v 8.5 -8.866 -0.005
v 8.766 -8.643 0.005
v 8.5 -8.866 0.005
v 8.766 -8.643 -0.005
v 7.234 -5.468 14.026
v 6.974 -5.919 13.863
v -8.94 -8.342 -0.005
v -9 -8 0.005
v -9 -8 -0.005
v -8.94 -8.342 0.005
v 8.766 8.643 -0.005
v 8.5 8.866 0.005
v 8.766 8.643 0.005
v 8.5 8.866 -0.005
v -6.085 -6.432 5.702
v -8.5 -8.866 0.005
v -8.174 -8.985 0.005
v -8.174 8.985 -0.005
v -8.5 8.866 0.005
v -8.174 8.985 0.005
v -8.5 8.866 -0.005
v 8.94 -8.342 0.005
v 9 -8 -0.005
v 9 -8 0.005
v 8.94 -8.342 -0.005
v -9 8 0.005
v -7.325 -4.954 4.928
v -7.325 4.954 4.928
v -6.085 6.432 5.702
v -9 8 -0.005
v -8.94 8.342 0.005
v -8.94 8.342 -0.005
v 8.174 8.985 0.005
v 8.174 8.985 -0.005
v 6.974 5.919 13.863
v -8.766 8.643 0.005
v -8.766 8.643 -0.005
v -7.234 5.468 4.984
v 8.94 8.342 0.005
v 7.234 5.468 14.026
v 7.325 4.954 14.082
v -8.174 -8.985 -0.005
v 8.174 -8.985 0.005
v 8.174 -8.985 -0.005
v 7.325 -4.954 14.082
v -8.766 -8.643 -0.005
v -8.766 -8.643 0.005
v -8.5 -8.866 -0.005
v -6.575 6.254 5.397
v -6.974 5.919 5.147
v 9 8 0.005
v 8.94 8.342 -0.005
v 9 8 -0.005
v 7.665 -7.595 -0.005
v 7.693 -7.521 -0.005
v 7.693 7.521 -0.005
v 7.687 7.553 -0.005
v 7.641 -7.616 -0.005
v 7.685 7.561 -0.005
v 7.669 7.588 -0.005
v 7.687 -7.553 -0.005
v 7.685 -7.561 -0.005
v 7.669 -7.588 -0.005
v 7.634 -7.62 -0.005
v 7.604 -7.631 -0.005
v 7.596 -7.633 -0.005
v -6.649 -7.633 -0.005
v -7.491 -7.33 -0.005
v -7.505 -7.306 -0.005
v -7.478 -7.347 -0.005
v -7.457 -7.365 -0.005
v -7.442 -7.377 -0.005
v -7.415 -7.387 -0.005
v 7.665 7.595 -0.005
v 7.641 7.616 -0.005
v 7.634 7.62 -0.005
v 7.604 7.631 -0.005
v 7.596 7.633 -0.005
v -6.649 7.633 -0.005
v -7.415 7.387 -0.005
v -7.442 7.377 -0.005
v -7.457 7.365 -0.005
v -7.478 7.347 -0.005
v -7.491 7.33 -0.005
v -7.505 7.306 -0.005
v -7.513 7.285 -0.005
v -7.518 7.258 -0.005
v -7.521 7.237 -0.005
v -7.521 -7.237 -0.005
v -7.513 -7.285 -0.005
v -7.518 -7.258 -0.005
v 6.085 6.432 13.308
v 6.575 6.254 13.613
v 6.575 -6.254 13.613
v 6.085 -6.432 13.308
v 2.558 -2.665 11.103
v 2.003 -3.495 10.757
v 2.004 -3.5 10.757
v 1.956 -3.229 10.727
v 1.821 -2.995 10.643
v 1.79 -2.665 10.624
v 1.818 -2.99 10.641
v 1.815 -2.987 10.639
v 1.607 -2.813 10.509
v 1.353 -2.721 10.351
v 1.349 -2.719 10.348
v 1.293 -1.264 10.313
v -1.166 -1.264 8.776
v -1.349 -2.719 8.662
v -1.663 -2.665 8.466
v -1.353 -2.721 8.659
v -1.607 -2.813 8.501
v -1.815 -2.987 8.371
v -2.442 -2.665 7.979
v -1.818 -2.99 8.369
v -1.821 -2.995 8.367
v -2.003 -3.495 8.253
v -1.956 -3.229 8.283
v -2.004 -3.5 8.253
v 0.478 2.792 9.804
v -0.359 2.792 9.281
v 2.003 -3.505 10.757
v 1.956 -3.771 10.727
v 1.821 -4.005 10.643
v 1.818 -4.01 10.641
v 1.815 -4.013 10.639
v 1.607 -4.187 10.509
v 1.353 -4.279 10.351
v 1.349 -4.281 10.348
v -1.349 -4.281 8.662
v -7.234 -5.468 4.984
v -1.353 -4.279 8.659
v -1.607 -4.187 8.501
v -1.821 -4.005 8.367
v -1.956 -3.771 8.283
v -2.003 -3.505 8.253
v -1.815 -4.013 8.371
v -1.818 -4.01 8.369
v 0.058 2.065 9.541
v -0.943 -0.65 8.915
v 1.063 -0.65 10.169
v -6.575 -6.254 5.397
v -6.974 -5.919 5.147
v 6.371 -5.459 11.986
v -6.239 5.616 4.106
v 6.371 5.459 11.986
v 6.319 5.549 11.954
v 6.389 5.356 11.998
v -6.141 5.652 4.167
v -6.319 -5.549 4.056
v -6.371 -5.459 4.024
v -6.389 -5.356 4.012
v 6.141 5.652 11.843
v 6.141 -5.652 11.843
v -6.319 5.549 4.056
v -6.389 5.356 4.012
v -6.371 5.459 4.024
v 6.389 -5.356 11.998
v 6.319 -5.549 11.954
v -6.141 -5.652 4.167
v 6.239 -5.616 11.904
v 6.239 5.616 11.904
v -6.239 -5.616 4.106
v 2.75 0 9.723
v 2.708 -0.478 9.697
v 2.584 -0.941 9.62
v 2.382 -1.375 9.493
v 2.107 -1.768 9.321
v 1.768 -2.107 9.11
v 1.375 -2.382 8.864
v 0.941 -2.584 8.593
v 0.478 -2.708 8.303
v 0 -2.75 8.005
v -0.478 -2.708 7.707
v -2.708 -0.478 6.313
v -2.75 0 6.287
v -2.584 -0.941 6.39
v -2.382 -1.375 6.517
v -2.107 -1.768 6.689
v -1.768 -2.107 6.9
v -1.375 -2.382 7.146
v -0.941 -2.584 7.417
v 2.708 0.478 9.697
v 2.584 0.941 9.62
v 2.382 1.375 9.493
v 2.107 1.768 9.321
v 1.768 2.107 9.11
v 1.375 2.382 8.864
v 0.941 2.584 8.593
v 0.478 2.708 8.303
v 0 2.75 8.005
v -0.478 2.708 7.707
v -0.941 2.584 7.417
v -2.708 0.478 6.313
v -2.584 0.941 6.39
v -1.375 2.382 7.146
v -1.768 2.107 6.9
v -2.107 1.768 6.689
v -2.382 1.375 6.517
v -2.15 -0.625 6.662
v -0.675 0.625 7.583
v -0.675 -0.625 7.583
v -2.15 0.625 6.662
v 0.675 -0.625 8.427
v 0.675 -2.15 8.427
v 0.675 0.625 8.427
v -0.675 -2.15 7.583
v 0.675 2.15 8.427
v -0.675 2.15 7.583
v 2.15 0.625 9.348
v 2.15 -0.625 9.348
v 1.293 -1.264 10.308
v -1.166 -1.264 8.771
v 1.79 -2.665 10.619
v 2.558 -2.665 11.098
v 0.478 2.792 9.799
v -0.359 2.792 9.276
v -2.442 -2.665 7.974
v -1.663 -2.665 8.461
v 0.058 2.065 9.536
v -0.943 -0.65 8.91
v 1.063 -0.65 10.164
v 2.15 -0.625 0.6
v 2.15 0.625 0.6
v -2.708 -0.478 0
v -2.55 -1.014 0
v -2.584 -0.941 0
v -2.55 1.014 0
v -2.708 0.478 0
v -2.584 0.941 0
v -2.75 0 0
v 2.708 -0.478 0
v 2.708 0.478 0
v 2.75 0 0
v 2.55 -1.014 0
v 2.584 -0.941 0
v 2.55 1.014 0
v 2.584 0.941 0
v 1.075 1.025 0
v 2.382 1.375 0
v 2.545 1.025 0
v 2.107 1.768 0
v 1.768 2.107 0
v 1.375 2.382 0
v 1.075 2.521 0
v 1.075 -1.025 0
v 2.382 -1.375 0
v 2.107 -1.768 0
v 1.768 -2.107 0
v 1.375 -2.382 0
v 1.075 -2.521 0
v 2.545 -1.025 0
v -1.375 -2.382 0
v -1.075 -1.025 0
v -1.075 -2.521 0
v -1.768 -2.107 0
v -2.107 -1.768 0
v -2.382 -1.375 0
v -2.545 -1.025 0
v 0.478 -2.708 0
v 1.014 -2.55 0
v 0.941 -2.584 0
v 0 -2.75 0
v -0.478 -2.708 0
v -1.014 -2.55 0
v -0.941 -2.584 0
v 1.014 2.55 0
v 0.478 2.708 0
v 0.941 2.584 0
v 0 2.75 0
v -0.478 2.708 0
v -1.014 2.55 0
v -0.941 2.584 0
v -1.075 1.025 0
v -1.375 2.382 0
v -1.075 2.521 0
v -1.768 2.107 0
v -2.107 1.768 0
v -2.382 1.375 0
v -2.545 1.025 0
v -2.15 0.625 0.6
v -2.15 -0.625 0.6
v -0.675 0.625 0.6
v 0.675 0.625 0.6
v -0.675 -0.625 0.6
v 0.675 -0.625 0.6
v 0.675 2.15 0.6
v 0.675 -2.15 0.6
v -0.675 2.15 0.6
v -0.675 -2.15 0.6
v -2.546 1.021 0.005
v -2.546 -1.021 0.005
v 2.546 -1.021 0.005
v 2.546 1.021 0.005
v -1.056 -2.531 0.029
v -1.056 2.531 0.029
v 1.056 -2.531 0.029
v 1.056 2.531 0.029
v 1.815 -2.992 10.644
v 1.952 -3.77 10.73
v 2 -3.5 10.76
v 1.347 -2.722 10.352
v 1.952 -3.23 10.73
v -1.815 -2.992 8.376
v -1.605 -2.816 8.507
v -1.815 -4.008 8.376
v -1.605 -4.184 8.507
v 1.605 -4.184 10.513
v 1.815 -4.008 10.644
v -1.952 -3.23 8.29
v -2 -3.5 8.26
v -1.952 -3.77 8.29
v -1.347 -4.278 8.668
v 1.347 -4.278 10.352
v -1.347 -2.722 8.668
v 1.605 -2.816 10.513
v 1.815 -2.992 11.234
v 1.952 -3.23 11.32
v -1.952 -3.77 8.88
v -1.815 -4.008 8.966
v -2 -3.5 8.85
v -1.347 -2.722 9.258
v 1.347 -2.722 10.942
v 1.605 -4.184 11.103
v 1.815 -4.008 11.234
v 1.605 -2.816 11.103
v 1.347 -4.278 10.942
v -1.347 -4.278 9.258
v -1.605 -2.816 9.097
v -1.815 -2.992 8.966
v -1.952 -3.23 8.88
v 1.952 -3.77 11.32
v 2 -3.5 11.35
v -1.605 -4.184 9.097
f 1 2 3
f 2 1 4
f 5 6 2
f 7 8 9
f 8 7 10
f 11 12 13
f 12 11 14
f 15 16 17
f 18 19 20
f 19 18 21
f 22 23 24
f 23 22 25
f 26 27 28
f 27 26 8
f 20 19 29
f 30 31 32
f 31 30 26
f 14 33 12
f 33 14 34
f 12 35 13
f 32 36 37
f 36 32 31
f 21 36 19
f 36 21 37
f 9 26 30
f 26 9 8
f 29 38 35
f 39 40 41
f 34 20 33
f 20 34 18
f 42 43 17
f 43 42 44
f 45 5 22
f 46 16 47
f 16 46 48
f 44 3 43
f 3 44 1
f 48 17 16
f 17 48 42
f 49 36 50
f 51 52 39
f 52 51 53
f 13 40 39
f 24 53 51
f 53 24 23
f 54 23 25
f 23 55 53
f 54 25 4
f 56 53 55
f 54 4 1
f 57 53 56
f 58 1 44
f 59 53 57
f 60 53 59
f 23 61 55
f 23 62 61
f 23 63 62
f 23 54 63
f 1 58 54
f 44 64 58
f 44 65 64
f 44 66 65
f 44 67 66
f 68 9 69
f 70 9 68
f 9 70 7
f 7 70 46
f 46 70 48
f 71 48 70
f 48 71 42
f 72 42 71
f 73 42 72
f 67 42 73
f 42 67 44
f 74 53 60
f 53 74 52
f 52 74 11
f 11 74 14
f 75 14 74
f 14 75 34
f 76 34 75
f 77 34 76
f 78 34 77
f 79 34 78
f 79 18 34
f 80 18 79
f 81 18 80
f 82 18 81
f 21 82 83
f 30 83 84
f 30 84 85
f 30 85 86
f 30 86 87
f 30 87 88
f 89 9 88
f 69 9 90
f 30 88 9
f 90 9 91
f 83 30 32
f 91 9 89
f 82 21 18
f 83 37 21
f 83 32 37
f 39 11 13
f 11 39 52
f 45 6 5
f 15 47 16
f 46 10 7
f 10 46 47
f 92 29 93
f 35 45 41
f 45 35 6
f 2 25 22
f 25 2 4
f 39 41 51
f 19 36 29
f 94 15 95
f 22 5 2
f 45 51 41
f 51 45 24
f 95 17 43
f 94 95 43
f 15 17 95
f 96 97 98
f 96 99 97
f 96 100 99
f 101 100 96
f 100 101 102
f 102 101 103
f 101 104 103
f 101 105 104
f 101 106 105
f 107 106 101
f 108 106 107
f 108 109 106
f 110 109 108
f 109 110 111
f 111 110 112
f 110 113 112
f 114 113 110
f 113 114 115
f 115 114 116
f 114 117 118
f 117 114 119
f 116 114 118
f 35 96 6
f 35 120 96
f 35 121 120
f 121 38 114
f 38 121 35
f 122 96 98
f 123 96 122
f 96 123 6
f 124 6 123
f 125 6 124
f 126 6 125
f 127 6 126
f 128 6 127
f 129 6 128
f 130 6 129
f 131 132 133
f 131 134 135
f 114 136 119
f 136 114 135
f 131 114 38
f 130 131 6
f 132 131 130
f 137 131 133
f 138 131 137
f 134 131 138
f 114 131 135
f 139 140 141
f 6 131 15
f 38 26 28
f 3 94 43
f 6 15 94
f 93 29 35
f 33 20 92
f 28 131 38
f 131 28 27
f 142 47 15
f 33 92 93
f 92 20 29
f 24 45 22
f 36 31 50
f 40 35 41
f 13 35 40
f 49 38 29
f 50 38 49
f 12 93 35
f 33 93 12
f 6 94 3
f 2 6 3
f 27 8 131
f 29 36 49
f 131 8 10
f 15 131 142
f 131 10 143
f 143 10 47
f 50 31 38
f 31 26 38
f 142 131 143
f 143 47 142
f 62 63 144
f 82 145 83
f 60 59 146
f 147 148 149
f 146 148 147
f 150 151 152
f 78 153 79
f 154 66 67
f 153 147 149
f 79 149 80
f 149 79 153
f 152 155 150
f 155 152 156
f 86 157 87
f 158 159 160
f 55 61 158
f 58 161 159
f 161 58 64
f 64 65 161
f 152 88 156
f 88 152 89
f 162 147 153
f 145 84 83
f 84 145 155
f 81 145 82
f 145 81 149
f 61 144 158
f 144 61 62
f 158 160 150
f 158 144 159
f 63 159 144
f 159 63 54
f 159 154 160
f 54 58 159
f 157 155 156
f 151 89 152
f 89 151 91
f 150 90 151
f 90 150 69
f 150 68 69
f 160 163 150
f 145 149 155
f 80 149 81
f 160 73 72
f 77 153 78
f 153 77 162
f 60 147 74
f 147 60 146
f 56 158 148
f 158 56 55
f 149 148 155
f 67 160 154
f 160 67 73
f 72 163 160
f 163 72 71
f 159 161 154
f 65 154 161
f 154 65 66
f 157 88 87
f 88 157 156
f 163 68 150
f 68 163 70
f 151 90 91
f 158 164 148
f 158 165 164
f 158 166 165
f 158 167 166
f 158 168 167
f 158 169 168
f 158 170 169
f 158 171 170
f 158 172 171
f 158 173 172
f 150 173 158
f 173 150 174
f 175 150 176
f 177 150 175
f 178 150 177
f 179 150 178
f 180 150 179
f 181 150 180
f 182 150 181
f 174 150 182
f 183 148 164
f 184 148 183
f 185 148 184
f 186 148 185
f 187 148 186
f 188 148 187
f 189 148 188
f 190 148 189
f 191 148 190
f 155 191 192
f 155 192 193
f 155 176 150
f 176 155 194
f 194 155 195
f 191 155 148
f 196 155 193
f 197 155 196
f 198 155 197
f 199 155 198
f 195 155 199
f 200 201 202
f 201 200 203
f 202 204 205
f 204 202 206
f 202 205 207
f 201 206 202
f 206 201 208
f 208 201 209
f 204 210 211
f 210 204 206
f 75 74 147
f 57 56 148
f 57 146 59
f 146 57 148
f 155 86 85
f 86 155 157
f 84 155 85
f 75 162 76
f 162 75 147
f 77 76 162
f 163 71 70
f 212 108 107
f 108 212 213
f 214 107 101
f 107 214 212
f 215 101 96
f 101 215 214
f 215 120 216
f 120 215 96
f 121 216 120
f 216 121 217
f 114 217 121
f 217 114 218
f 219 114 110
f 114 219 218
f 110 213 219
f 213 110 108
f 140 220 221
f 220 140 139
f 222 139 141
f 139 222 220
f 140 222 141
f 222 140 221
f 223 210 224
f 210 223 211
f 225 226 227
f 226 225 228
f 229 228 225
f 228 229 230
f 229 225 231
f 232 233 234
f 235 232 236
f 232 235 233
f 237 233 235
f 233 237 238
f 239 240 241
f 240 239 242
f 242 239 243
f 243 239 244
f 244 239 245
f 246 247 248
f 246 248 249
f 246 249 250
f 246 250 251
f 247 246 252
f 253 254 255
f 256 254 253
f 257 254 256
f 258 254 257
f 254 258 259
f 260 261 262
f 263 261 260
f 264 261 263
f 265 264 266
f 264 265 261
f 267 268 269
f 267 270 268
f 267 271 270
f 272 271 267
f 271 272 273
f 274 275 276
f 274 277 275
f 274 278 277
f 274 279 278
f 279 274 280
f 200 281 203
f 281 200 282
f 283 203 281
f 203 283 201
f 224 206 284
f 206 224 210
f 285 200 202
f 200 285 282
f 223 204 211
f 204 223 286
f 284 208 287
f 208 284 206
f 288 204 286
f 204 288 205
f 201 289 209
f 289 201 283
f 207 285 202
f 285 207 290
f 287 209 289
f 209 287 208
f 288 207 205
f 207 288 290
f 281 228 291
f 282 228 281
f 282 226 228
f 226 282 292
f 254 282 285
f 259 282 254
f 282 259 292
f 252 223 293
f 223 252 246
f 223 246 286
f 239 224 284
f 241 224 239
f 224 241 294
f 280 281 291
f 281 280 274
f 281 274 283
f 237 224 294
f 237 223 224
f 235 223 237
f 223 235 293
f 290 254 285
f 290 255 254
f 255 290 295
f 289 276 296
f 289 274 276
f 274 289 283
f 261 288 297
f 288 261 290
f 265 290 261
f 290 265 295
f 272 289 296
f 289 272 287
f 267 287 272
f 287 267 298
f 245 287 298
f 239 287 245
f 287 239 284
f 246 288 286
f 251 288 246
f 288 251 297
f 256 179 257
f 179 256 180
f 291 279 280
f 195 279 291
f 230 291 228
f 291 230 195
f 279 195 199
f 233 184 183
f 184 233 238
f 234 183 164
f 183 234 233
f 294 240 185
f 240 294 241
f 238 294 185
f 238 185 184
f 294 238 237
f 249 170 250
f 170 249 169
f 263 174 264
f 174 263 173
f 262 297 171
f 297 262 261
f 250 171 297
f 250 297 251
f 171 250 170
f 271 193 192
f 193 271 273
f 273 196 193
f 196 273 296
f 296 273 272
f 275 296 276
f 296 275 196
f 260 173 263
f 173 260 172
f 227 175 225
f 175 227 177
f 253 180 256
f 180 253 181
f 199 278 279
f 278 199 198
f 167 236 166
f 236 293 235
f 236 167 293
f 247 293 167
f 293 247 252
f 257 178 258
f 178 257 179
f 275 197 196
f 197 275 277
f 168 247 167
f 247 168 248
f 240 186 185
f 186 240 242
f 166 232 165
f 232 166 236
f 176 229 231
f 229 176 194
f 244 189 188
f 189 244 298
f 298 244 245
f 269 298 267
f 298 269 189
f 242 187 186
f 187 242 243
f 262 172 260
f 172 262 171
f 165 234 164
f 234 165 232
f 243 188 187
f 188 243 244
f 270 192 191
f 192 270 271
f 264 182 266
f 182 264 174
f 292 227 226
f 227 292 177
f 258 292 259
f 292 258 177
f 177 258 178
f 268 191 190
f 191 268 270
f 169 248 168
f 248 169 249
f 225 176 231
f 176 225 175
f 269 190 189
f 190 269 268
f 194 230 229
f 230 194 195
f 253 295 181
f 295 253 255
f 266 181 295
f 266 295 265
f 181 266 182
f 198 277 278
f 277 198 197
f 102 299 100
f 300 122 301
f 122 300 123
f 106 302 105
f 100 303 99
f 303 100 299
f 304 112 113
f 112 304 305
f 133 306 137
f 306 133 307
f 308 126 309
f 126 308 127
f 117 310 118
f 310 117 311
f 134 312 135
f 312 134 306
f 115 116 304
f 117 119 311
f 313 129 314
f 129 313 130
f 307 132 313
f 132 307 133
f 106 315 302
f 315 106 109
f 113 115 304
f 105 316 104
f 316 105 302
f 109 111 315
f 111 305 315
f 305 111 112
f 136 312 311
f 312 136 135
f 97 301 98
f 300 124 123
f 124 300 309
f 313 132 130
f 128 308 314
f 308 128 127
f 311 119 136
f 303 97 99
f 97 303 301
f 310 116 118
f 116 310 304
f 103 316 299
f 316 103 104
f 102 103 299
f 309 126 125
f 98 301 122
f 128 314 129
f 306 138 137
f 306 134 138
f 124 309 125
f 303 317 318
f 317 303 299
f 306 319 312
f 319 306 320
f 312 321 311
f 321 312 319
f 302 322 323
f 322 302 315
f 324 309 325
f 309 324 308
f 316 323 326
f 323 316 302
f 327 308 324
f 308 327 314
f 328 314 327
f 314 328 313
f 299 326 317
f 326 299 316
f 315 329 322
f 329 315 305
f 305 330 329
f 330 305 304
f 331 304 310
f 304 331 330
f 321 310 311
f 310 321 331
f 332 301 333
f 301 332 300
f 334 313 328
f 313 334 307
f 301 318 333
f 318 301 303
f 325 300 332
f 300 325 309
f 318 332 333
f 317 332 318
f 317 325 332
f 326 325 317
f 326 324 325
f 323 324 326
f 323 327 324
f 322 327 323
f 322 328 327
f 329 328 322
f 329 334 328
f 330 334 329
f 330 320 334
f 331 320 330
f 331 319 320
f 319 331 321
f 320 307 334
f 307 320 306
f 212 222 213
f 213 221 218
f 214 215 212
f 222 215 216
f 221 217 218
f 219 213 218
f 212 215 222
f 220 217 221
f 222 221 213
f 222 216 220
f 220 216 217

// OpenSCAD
// file: ../modules/homing_bar.scad
function homing_bar_quality_steps(quality, preview_steps, export_steps) =
    quality == "preview" ? preview_steps : export_steps;

module homing_bar_profile(length, width, quality = "export") {
    end_steps = homing_bar_quality_steps(quality, 18, 32);
    cap_length = max(length, width);

    hull() {
        translate([-cap_length / 2 + width / 2, 0])
            circle(d = width, $fn = end_steps);
        translate([ cap_length / 2 - width / 2, 0])
            circle(d = width, $fn = end_steps);
    }
}

module homing_bar_blank(
    length,
    width,
    height,
    base_thickness,
    offset_y,
    base_z,
    quality = "export"
) {
    cap_height = max(height, 0.05);
    contact_height = max(base_thickness, 0.05);
    contact_length = length + contact_height * 1.6;
    contact_width = width + contact_height * 1.2;

    translate([0, offset_y, base_z])
        union() {
            hull() {
                linear_extrude(height = 0.01)
                    homing_bar_profile(contact_length, contact_width, quality);
                translate([0, 0, contact_height])
                    linear_extrude(height = 0.01)
                        homing_bar_profile(length, width, quality);
            }

            translate([0, 0, contact_height])
                linear_extrude(height = cap_height)
                    homing_bar_profile(length, width, quality);
        }
}
// file: ../modules/stem_alps.scad
function positive_alps_stem_dimension(value, minimum = 0.1) = max(value, minimum);

module alps_post(stem_length, stem_width, stem_height, lead_in) {
    safe_length = positive_alps_stem_dimension(stem_length);
    safe_width = positive_alps_stem_dimension(stem_width);
    safe_height = max(stem_height, 0.2);
    safe_lead_in = min(lead_in, safe_length * 0.2, safe_width * 0.3, safe_height * 0.4);

    hull() {
        linear_extrude(height = max(safe_height - safe_lead_in, 0.01))
            square([safe_length, safe_width], center = true);

        translate([0, 0, safe_height - 0.01])
            linear_extrude(height = 0.01)
                square([
                    positive_alps_stem_dimension(safe_length - safe_lead_in * 2),
                    positive_alps_stem_dimension(safe_width - safe_lead_in * 2)
                ], center = true);
    }
}

module stem_alps(
    stem_length = 4.45,
    stem_width = 2.25,
    stem_height = 3.5,
    base_clearance = 0,
    lead_in = 0.12,
    quality = "export"
) {
    translate([0, 0, base_clearance])
        alps_post(stem_length, stem_width, stem_height, lead_in);
}
// file: ../modules/stem_choc_v2.scad
use <stem_mx.scad>

module stem_choc_v2(
    outer_diameter = 5.5,
    stem_height = 6.5,
    base_clearance = 0,
    cross_width_horizontal = 1.25,
    cross_length_horizontal = 4.3,
    cross_width_vertical = 1.35,
    cross_length_vertical = 4.3,
    cross_chamfer = 0.4,
    chamfer_height = 0.6,
    quality = "export"
) {
    stem_mx(
        outer_diameter = outer_diameter,
        stem_height = stem_height,
        base_clearance = base_clearance,
        cross_width_horizontal = cross_width_horizontal,
        cross_length_horizontal = cross_length_horizontal,
        cross_width_vertical = cross_width_vertical,
        cross_length_vertical = cross_length_vertical,
        cross_chamfer = cross_chamfer,
        chamfer_height = chamfer_height,
        quality = quality
    );
}
// file: ../modules/stem_choc_v1.scad
function positive_choc_stem_dimension(value, minimum = 0.1) = max(value, minimum);

module choc_v1_prong(prong_width, prong_depth, prong_height, lead_in) {
    safe_width = positive_choc_stem_dimension(prong_width);
    safe_depth = positive_choc_stem_dimension(prong_depth);
    safe_height = max(prong_height, 0.2);
    safe_lead_in = min(lead_in, safe_width * 0.4, safe_depth * 0.2, safe_height * 0.4);

    hull() {
        linear_extrude(height = max(safe_height - safe_lead_in, 0.01))
            square([safe_width, safe_depth], center = true);

        translate([0, 0, safe_height - 0.01])
            linear_extrude(height = 0.01)
                square([
                    positive_choc_stem_dimension(safe_width - safe_lead_in * 2),
                    positive_choc_stem_dimension(safe_depth - safe_lead_in * 2)
                ], center = true);
    }
}

module stem_choc_v1(
    prong_width = 1.2,
    prong_depth = 3.0,
    prong_spacing = 5.7,
    stem_height = 3.0,
    base_clearance = 0,
    lead_in = 0.12,
    quality = "export"
) {
    for (offset_x = [prong_spacing / 2, -prong_spacing / 2]) {
        translate([offset_x, 0, base_clearance])
            choc_v1_prong(prong_width, prong_depth, stem_height, lead_in);
    }
}
// file: ../modules/stem_mx.scad
function stem_quality_steps(quality, preview_steps, export_steps) =
    quality == "preview" ? preview_steps : export_steps;

module stem_slot(length, width, height) {
    translate([-length / 2, -width / 2, 0])
        cube([length, width, height]);
}

module stem_mx(
    outer_diameter = 5.5,
    stem_height = 4.5,
    base_clearance = 0,
    cross_width_horizontal = 1.25,
    cross_length_horizontal = 4.3,
    cross_width_vertical = 1.35,
    cross_length_vertical = 4.3,
    cross_chamfer = 0.4,
    chamfer_height = 0.6,
    quality = "export"
) {
    outer_steps = stem_quality_steps(quality, 36, 64);
    safe_height = max(stem_height, 0.2);

    difference() {
        translate([0, 0, base_clearance])
            cylinder(d = outer_diameter, h = safe_height, $fn = outer_steps);

        translate([0, 0, base_clearance]) {
            stem_slot(cross_length_horizontal, cross_width_horizontal, safe_height + 1);
            stem_slot(cross_width_vertical, cross_length_vertical, safe_height + 1);
        }

        if (cross_chamfer > 0) {
            translate([0, 0, base_clearance - 0.01])
                hull() {
                    stem_slot(
                        cross_length_horizontal + cross_chamfer * 2,
                        cross_width_horizontal + cross_chamfer * 2,
                        0.01
                    );
                    translate([0, 0, chamfer_height])
                        stem_slot(cross_length_horizontal, cross_width_horizontal, 0.01);
                }

            translate([0, 0, base_clearance - 0.01])
                hull() {
                    stem_slot(
                        cross_width_vertical + cross_chamfer * 2,
                        cross_length_vertical + cross_chamfer * 2,
                        0.01
                    );
                    translate([0, 0, chamfer_height])
                        stem_slot(cross_width_vertical, cross_length_vertical, 0.01);
                }
        }
    }
}
// file: ../modules/legend_block.scad
function legend_text_length(label) = max(len(label), 1);
function legend_is_single_glyph(label) = legend_text_length(label) == 1;
function legend_quality_steps(quality, preview_steps, export_steps) =
    quality == "preview" ? preview_steps : export_steps;
function legend_text_curve_steps(quality = "export") =
    legend_quality_steps(quality, 48, 96);
function legend_text_internal_scale(quality = "export") =
    legend_quality_steps(quality, 6, 10);
function legend_single_glyph_target_width(width, depth) =
    min(width * 0.96, max(depth * 1.25, 4.8));
function legend_text_size(label, width, depth) =
    let(
        width_fit = (width * 1.5) / legend_text_length(label),
        depth_fit = depth * 0.98
    )
    max(min(depth_fit, width_fit), 1.0);

module legend_text_shape(label, size, font_name, curve_steps = 48) {
    text(
        text = label,
        size = size,
        font = font_name,
        halign = "center",
        valign = "center",
        $fn = curve_steps
    );
}

module legend_resized_text_shape(label, size, width, depth, font_name, curve_steps = 48) {
    if (legend_is_single_glyph(label)) {
        resize([legend_single_glyph_target_width(width, depth), 0, 0], auto = [false, true, true])
            legend_text_shape(
                label = label,
                size = size,
                font_name = font_name,
                curve_steps = curve_steps
            );
    } else {
        text(
            text = label,
            size = size,
            font = font_name,
            halign = "center",
            valign = "center",
            $fn = curve_steps
        );
    }
}

// Keep decoration options available across bundled fonts without requiring extra font files.
module legend_text_profile(
    label,
    size,
    width,
    depth,
    font_name,
    outline_delta = 0,
    curve_steps = 48
) {
    if (abs(outline_delta) > 0.0001) {
        offset(delta = outline_delta)
            legend_resized_text_shape(
                label = label,
                size = size,
                width = width,
                depth = depth,
                font_name = font_name,
                curve_steps = curve_steps
            );
    } else {
        legend_resized_text_shape(
            label = label,
            size = size,
            width = width,
            depth = depth,
            font_name = font_name,
            curve_steps = curve_steps
        );
    }
}

module legend_block(
    label,
    width,
    depth,
    height,
    offset_x,
    offset_y,
    base_z,
    font_name = "M PLUS 1:style=Regular",
    underline_enabled = false,
    underline_width = 0,
    underline_thickness = 0,
    underline_offset_y = 0,
    outline_delta = 0,
    quality = "export"
) {
    if (!is_undef(label) && len(label) > 0) {
        size = legend_text_size(label, width, depth);
        curve_steps = legend_text_curve_steps(quality);
        internal_scale = legend_text_internal_scale(quality);

        translate([offset_x, offset_y, base_z])
            linear_extrude(height = height, center = false, convexity = 10)
                // Build glyph outlines at a larger internal scale so the bundled runtime
                // preserves more of the original font curvature before scaling back down.
                scale([1 / internal_scale, 1 / internal_scale, 1])
                    union() {
                        legend_text_profile(
                            label = label,
                            size = size * internal_scale,
                            width = width * internal_scale,
                            depth = depth * internal_scale,
                            font_name = font_name,
                            outline_delta = outline_delta * internal_scale,
                            curve_steps = curve_steps
                        );

                        if (underline_enabled && underline_width > 0 && underline_thickness > 0) {
                            translate([0, underline_offset_y * internal_scale])
                                square(
                                    [underline_width * internal_scale, underline_thickness * internal_scale],
                                    center = true
                                );
                        }
                    }
    }
}
// file: ../presets/standard-1u.scad
default_key_width = 18;
default_key_depth = 18;
default_top_center_height = 9.5;
default_wall_thickness = 1.2;
default_top_scale = 0.84;

default_profile_front_angle = 15;
default_profile_back_angle = 15;
default_profile_left_angle = 10;
default_profile_right_angle = 10;
default_top_thickness = 1.5;
default_bottom_corner_radius = 1.0;
default_top_corner_radius = 1.5;
default_dish_radius = 45;
default_dish_depth = 0;
default_top_pitch_deg = 0;
default_top_roll_deg = 0;

default_legend_text = "A";
default_legend_font_name = "M PLUS 1:style=Regular";
default_legend_underline_enabled = false;
default_legend_underline_width = 0;
default_legend_underline_thickness = 0;
default_legend_underline_offset_y = 0;
default_legend_width = 7.2;
default_legend_depth = 4.0;
default_legend_height = 0;
default_legend_outline_delta = 0;
default_legend_offset_x = 0;
default_legend_offset_y = 0;
default_legend_embed = 0.6;

default_homing_bar_enabled = false;
default_homing_bar_height = 0.6;
default_homing_bar_length = 4;
default_homing_bar_width = 1.58;
default_homing_bar_offset_y = -3.5;
default_homing_bar_base_thickness = 0.35;

default_stem_outer_diameter = 5.5;
default_stem_width = default_stem_outer_diameter;
default_stem_depth = default_stem_outer_diameter;
default_stem_height = 6.5;
default_stem_inset = 0;
default_stem_cross_width_horizontal = 1.25;
default_stem_cross_length_horizontal = 4.3;
default_stem_cross_width_vertical = 1.35;
default_stem_cross_length_vertical = 4.3;
default_stem_cross_chamfer = 0.4;

default_stem_type = "choc_v2";

default_stem_mx_outer_diameter = 5.5;
default_stem_mx_height = 4.5;
default_stem_mx_inset = 0;
default_stem_mx_cross_width_horizontal = default_stem_cross_width_horizontal;
default_stem_mx_cross_length_horizontal = default_stem_cross_length_horizontal;
default_stem_mx_cross_width_vertical = default_stem_cross_width_vertical;
default_stem_mx_cross_length_vertical = default_stem_cross_length_vertical;
default_stem_mx_cross_chamfer = default_stem_cross_chamfer;

default_stem_choc_v2_outer_diameter = default_stem_outer_diameter;
default_stem_choc_v2_height = default_stem_height;
default_stem_choc_v2_inset = default_stem_inset;
default_stem_choc_v2_cross_width_horizontal = default_stem_cross_width_horizontal;
default_stem_choc_v2_cross_length_horizontal = default_stem_cross_length_horizontal;
default_stem_choc_v2_cross_width_vertical = default_stem_cross_width_vertical;
default_stem_choc_v2_cross_length_vertical = default_stem_cross_length_vertical;
default_stem_choc_v2_cross_chamfer = default_stem_cross_chamfer;

default_stem_choc_v1_height = 3.0;
default_stem_choc_v1_inset = 0;
default_stem_choc_v1_prong_width = 1.2;
default_stem_choc_v1_prong_depth = 3.0;
default_stem_choc_v1_prong_spacing = 5.7;
default_stem_choc_v1_lead_in = 0.12;

default_stem_alps_height = 3.5;
default_stem_alps_inset = 0;
default_stem_alps_length = 4.45;
default_stem_alps_width = 2.25;
default_stem_alps_lead_in = 0.12;
// main file
export_target = "preview";

user_key_width = 18;
user_key_depth = 18;
user_top_center_height = 9.5;
user_top_pitch_deg = 0;
user_top_roll_deg = 32;
user_wall_thickness = 1.2;
user_top_scale = 0.84;
user_dish_radius = 45;
user_dish_depth = 0;

user_legend_enabled = true;
user_legend_text = "A";
user_legend_font_name = "M PLUS 1:style=Regular";
user_legend_underline_enabled = false;
user_legend_width = 7.2;
user_legend_depth = 4.0;
user_legend_height = 0;
user_legend_embed = 0.6;
user_legend_outline_delta = 0;

user_homing_bar_enabled = true;
user_homing_bar_height = 0.6;
user_homing_bar_length = 4.0;
user_homing_bar_width = 1.58;
user_homing_bar_offset_y = -3.5;
user_homing_bar_base_thickness = 0.35;

user_stem_type = "choc_v2";
user_stem_outer_delta = 0;
user_stem_cross_margin = 0;
user_stem_inset_delta = 0;

include <../base/keycap.scad>
